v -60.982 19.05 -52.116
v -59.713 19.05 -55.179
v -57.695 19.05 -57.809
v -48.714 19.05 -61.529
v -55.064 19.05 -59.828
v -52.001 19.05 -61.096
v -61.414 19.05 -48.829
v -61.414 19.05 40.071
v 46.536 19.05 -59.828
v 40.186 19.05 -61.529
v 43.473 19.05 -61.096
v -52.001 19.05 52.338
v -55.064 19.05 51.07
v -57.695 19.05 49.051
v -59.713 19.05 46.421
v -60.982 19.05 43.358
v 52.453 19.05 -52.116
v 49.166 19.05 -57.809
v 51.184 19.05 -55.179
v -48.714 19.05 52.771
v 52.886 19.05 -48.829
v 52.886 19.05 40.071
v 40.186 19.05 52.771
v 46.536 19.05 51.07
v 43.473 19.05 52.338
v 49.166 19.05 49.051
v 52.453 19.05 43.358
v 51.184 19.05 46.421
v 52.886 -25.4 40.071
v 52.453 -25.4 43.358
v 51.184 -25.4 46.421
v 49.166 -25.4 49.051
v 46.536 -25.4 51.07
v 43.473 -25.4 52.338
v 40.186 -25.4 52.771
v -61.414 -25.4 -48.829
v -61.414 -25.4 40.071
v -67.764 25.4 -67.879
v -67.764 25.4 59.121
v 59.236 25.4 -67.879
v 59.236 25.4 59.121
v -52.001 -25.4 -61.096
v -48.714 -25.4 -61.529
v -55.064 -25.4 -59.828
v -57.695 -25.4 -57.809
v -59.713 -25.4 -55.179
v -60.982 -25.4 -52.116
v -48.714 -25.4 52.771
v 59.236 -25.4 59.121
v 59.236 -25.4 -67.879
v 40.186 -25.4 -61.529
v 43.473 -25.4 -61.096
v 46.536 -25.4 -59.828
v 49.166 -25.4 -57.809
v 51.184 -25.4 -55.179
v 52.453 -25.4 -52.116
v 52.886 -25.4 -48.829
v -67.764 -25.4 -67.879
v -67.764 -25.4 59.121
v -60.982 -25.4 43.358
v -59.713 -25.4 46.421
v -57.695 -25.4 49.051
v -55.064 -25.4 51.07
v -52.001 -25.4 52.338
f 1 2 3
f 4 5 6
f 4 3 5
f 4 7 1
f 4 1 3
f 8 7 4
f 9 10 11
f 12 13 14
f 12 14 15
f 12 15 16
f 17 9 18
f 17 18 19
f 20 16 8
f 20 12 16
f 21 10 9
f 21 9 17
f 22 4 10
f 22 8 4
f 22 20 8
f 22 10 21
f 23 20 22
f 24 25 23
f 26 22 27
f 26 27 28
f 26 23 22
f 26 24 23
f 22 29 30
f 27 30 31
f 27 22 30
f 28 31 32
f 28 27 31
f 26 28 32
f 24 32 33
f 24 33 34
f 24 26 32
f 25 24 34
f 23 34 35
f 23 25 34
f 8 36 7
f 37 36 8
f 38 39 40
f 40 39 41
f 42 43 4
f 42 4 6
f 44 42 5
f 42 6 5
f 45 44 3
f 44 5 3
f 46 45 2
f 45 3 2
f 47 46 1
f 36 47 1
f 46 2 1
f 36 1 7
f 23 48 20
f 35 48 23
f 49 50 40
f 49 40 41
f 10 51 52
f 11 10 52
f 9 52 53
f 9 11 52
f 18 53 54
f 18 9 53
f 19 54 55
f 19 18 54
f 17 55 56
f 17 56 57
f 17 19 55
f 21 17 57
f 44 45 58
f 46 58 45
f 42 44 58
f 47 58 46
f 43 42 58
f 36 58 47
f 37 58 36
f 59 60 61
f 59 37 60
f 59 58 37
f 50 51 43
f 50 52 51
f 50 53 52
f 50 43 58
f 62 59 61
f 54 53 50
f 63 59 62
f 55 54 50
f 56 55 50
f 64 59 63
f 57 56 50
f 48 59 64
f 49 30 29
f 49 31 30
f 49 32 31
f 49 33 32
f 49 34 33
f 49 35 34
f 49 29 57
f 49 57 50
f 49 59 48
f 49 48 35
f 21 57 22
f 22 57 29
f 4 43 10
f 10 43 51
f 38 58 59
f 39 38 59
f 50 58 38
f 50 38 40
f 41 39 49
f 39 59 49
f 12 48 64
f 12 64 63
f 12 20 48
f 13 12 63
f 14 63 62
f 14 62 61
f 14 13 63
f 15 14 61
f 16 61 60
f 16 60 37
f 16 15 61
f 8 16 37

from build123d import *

# Parameters (mm, degrees)
F0_W          = 127
F0_H          = 127
F1_DEPTH      = 25.4
F1_DEPTH_BACK = 25.4
F2_W          = 114.3
F2_H          = 114.3
F3_DEPTH      = 44.45
F4_R          = 12.7


with BuildPart() as f1:
    # F0 (on Front) → F1 (new body, two sides)
    with BuildSketch(Plane.XZ) as f1_sk:
        with Locations((-4.264493, -4.37899)):
            Rectangle(F0_W, F0_H)
    extrude(amount=F1_DEPTH)
    extrude(f1_sk.sketch, amount=-F1_DEPTH_BACK)

    # F2 (on face) → F3 (cut)
    with BuildSketch(Plane.XZ.offset(25.4)):
        with Locations((-4.264493, -4.37899)):
            Rectangle(F2_W, F2_H)
    extrude(amount=-F3_DEPTH, mode=Mode.SUBTRACT)

    # F4
    f4_edges = [f1.edges().sort_by_distance(p)[0] for p in [
        (-61.414493, -3.175, -61.52899),
        (52.885507, -3.175, -61.52899),
        (52.885507, -3.175, 52.77101),
        (-61.414493, -3.175, 52.77101),
    ]]
    fillet(f4_edges, radius=F4_R)


solid = f1.part
